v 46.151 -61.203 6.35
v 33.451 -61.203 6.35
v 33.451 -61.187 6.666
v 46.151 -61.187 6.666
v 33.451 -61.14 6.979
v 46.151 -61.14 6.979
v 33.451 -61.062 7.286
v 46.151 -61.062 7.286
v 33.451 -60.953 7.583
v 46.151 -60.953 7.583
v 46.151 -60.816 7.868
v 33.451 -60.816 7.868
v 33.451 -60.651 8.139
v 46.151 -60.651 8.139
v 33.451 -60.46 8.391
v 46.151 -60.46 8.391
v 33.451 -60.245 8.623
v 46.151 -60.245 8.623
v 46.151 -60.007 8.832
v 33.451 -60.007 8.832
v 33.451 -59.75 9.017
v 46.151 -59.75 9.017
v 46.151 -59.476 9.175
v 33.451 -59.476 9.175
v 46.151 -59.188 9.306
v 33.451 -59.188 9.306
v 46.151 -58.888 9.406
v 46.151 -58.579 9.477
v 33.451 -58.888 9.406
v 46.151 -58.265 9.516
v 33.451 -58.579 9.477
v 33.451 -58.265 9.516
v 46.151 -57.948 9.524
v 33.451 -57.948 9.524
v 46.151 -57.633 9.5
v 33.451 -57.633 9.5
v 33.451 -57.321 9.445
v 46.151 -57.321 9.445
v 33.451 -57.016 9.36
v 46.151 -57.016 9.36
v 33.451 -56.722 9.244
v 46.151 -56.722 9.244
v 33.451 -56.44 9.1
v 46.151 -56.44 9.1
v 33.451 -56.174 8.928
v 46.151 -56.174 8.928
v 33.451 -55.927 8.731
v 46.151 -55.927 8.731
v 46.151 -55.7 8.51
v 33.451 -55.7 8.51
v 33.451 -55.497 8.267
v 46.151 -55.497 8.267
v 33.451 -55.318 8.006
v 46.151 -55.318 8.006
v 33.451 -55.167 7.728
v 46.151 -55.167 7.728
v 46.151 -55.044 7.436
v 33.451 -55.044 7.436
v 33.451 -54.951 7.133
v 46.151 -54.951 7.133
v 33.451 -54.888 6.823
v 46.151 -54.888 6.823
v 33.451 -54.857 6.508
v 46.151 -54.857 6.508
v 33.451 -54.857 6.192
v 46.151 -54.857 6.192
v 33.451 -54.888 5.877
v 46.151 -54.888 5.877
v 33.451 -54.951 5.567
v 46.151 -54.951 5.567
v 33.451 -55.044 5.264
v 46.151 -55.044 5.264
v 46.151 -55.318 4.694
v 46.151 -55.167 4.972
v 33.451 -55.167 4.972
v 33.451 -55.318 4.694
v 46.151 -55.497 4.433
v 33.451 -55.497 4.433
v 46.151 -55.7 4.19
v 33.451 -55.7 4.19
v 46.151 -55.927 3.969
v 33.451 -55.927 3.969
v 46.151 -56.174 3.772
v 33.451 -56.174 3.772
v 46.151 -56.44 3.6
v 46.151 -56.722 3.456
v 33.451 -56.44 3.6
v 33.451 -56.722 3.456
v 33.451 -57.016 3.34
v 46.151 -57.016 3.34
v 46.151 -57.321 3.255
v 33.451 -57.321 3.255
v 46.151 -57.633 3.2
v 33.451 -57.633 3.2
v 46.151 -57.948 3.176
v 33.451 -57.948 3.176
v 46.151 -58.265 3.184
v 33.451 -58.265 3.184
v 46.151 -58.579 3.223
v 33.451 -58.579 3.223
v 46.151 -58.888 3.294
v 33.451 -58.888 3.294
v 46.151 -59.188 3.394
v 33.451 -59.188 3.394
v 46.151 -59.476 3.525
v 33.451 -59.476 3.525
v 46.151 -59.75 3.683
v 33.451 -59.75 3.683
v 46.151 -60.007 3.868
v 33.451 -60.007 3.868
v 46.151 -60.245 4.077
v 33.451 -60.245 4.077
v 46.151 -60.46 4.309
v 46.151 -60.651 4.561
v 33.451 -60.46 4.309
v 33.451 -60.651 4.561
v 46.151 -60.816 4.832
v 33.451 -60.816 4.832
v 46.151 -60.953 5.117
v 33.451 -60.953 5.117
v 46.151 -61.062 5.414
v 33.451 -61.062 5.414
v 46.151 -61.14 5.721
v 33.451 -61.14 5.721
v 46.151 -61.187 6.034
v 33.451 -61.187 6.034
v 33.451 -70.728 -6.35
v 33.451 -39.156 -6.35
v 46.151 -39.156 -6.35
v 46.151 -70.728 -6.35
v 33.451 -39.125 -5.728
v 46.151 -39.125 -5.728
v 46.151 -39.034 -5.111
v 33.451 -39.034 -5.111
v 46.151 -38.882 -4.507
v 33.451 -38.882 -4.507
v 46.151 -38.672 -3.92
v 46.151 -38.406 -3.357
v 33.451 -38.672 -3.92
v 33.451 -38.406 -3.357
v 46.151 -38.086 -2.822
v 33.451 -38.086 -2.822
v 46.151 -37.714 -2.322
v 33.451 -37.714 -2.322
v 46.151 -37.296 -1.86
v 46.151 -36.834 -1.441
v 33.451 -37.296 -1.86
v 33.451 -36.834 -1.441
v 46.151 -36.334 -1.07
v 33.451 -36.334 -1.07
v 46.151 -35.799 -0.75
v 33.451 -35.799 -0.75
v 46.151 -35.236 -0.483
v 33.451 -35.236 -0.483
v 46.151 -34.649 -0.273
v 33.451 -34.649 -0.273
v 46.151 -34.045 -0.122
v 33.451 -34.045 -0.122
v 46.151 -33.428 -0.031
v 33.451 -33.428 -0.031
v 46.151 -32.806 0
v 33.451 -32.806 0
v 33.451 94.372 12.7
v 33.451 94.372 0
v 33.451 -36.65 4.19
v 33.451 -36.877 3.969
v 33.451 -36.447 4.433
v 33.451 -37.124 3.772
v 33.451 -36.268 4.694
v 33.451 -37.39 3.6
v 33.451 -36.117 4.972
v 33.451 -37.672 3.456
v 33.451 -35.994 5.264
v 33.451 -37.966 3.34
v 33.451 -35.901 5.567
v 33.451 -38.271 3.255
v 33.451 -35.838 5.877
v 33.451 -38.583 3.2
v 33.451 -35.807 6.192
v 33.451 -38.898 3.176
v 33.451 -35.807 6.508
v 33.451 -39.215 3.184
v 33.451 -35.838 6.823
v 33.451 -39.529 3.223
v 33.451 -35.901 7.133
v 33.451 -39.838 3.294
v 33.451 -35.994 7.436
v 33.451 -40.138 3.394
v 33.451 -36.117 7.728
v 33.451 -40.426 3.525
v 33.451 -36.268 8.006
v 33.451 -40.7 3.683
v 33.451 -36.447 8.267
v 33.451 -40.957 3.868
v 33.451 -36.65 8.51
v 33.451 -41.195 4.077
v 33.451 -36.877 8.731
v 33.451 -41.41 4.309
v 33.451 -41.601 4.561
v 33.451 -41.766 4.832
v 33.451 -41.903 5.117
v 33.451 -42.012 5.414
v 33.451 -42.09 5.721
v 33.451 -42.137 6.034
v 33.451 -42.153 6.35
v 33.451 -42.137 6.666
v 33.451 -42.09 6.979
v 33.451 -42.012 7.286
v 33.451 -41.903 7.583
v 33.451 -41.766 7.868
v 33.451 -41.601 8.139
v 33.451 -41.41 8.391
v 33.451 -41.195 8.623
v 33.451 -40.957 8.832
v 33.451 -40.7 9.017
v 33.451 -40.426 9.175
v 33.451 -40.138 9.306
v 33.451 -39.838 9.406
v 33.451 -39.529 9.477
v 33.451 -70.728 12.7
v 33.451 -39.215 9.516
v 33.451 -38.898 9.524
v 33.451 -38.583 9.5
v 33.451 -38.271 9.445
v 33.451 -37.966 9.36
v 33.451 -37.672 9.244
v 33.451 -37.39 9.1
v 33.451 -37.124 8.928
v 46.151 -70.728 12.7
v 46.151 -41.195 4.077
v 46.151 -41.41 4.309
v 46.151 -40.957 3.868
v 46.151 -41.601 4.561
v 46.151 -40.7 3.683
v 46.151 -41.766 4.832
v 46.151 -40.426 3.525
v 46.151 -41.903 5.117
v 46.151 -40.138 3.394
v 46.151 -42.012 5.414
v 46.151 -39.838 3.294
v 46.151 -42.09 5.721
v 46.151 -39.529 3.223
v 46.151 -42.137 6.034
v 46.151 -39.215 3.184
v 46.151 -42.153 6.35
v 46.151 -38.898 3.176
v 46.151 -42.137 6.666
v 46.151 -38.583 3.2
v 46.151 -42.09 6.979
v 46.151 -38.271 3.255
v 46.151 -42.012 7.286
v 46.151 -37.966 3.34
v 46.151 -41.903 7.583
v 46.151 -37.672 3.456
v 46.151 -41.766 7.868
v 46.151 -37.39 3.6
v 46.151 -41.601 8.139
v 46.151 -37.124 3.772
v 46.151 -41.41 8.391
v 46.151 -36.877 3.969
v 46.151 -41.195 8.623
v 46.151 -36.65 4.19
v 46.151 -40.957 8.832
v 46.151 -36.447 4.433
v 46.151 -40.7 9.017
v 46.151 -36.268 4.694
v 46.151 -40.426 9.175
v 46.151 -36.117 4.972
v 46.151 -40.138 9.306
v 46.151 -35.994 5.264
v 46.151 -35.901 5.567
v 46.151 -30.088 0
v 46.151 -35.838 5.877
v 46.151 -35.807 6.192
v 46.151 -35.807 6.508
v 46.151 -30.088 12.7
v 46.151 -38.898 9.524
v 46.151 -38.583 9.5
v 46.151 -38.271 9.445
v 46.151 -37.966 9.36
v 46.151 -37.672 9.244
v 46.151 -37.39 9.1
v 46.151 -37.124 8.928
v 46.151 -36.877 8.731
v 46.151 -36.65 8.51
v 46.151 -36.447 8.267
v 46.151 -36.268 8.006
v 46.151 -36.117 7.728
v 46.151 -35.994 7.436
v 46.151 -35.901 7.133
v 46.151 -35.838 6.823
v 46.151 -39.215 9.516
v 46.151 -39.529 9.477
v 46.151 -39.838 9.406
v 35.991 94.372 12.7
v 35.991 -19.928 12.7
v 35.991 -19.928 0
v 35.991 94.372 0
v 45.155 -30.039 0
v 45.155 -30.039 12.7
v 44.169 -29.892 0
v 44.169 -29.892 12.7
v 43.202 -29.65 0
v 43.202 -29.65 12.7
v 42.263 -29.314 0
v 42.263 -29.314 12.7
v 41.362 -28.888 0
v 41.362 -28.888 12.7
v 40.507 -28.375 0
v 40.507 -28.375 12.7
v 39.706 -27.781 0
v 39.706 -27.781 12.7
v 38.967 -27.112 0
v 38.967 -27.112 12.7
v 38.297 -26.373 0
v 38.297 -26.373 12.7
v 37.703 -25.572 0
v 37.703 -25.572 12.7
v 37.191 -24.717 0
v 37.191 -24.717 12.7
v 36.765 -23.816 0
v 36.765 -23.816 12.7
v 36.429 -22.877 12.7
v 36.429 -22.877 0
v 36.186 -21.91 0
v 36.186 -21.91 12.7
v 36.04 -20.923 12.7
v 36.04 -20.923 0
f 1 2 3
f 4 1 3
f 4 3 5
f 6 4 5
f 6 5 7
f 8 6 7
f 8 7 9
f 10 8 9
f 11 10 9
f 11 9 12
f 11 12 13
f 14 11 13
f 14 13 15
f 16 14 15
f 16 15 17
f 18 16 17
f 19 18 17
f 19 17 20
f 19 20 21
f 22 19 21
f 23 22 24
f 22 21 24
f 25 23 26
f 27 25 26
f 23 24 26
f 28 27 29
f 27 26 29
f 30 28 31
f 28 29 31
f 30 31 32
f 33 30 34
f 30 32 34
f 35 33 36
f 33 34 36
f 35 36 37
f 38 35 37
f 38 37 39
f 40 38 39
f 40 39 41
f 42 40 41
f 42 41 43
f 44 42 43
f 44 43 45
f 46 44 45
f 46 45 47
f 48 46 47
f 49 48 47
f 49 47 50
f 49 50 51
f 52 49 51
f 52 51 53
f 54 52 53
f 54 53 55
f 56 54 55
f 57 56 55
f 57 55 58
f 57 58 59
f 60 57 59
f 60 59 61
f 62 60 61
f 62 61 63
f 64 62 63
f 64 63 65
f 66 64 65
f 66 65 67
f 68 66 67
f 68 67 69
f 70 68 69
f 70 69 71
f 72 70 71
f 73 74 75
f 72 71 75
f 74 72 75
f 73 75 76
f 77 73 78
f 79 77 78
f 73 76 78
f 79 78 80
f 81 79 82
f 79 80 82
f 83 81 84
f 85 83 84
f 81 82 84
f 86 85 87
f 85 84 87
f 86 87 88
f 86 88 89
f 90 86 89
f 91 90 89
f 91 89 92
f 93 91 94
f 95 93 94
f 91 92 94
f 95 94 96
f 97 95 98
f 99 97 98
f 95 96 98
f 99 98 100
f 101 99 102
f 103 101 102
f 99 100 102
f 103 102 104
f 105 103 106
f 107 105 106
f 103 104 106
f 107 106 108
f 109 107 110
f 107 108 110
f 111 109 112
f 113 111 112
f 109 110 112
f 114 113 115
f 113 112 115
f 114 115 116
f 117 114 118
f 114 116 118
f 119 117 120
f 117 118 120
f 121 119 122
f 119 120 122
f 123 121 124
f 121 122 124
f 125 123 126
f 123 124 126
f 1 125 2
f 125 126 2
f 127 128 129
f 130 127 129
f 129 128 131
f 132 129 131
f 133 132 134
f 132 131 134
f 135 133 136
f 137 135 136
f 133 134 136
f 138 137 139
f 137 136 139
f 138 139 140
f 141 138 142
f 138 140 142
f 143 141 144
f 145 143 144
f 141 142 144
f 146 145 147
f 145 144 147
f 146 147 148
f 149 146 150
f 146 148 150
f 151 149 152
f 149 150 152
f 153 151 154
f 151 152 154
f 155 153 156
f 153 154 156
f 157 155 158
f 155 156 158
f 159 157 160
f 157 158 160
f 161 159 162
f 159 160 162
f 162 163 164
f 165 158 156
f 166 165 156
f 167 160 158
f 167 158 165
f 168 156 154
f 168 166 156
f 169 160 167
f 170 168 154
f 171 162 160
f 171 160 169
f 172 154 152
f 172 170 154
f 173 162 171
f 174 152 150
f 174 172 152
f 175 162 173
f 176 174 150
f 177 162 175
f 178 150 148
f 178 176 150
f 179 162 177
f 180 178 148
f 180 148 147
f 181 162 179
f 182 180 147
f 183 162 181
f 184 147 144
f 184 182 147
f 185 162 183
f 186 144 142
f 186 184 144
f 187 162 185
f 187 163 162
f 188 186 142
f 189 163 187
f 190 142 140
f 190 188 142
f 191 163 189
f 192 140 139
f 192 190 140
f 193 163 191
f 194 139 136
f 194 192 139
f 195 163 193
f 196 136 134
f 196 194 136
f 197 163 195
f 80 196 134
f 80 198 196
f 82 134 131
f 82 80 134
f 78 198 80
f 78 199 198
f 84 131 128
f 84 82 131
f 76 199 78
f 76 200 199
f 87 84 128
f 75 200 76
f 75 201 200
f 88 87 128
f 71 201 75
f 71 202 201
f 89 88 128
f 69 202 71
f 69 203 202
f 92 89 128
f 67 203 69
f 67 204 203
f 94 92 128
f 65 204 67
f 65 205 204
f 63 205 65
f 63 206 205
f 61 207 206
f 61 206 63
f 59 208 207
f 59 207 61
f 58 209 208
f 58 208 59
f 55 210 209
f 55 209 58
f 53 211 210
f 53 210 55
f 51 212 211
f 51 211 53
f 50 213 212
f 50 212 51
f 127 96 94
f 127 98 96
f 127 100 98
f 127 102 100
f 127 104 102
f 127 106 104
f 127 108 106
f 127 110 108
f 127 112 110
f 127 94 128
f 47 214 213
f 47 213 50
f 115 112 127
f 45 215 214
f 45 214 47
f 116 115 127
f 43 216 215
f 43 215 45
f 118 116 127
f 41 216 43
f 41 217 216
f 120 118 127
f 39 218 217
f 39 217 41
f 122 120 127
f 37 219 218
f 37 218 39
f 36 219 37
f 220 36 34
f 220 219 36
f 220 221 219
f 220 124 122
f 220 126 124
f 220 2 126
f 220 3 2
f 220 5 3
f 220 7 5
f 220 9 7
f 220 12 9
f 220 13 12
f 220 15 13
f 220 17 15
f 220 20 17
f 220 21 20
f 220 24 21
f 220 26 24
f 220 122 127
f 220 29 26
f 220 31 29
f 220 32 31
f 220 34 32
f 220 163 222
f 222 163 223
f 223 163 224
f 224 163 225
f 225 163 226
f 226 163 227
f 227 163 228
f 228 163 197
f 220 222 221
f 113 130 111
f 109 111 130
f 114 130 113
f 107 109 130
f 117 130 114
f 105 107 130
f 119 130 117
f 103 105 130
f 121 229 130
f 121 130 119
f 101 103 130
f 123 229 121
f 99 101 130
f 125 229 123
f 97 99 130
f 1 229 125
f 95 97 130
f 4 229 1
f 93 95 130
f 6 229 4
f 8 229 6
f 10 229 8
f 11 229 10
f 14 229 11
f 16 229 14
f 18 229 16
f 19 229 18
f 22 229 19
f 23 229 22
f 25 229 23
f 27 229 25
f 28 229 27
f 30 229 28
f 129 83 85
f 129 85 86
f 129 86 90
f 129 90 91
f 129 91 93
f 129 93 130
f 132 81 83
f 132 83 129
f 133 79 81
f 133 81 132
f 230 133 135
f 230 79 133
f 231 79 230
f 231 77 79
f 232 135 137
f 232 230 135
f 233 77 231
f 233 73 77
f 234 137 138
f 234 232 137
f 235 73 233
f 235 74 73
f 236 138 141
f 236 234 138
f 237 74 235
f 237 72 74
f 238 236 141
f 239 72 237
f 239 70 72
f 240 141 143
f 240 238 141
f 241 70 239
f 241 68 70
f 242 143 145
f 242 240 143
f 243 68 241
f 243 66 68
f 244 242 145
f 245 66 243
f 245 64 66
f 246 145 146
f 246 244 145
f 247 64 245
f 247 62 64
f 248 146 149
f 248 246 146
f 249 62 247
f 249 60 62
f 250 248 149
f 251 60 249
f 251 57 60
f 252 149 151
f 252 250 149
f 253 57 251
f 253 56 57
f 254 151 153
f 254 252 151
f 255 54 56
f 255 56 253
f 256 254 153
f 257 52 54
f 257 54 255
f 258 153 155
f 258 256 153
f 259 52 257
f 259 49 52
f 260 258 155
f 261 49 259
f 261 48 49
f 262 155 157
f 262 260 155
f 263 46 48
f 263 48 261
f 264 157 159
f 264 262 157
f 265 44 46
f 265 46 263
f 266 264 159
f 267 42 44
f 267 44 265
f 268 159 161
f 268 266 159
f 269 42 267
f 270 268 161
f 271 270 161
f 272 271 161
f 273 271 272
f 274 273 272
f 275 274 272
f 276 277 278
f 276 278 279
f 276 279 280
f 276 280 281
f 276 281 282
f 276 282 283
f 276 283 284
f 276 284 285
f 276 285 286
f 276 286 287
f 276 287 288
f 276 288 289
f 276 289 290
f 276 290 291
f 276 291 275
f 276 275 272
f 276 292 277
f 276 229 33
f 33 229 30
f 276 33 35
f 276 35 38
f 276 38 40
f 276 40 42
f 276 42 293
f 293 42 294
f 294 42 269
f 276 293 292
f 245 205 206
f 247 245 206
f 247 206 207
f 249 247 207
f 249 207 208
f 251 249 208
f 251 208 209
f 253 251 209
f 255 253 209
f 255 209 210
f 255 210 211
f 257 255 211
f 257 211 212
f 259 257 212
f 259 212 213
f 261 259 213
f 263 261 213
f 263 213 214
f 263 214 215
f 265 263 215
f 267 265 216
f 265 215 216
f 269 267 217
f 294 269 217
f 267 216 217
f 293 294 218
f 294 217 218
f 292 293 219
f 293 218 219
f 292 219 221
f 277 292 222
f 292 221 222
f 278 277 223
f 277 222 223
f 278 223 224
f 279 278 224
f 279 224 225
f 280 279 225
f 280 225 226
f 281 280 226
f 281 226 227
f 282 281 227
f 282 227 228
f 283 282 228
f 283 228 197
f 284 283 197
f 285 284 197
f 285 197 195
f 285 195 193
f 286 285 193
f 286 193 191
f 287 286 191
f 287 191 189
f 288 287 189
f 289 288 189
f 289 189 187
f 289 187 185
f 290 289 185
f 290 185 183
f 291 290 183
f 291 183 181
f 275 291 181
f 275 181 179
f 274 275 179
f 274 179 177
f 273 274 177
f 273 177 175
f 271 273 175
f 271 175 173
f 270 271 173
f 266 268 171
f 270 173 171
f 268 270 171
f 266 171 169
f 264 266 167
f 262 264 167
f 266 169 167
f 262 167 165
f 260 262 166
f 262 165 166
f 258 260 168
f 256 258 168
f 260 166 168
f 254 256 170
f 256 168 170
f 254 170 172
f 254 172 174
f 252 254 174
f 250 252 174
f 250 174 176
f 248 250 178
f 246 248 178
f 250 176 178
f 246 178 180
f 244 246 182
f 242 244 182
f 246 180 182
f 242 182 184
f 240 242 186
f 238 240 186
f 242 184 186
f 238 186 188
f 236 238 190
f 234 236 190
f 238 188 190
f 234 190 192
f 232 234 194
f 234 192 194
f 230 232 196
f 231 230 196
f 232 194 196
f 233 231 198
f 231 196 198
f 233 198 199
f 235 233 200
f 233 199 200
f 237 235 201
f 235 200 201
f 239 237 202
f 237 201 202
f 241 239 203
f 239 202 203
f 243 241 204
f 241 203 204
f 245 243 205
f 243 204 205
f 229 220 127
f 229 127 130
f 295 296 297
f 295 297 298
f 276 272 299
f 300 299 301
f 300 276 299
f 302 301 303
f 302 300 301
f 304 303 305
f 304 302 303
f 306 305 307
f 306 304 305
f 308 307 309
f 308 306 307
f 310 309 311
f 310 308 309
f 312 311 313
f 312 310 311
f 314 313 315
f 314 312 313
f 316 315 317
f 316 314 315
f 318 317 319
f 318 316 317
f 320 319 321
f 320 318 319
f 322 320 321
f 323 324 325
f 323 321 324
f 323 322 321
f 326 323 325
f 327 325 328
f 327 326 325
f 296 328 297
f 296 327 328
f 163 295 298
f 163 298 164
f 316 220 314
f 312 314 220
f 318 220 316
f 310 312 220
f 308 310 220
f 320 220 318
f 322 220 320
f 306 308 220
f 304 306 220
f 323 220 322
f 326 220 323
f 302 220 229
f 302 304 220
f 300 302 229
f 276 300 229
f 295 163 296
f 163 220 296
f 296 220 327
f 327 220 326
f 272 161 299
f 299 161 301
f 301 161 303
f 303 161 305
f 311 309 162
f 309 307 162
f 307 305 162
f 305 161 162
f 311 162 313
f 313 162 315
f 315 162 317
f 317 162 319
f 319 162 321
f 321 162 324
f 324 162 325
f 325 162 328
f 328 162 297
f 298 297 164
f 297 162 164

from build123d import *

# Parameters (mm, degrees)
F1_DEPTH = 12.7
F2_R     = 3.175
F3_DEPTH = 25.4
F4_DEPTH = 6.35
F6_DEPTH = 25.4


with BuildPart() as f1:
    # F0 (on Top) → F1 (new body)
    with BuildSketch(Plane.XY):
        with BuildLine():
            Line((35.9911476828, 94.3723806679), (33.4511476828, 94.3723806679))
            Line((33.4511476828, 94.3723806679), (33.4511476828, -70.7276193321))
            Line((33.4511476828, -70.7276193321), (46.1511476828, -70.7276193321))
            Line((46.1511476828, -70.7276193321), (46.1511476828, -30.0876193321))
            ThreePointArc((46.1511476828, -30.0876193321), (38.9669427859, -27.1118242289), (35.9911476828, -19.9276193321))
            Line((35.9911476828, -19.9276193321), (35.9911476828, 94.3723806679))
        make_face()
    extrude(amount=F1_DEPTH)

    # F2 (on face) → F3 (cut)
    with BuildSketch(Plane(origin=(33.4511476828, 0, 0), x_dir=(0, -1, 0), z_dir=(-1, 0, 0))):
        with Locations((58.0276193321, 6.35)):
            Circle(F2_R)
        with Locations((38.9776193321, 6.35)):
            Circle(F2_R)
    extrude(amount=-F3_DEPTH, mode=Mode.SUBTRACT)

    # F4 (add): a face of the model
    f4_faces = [f1.faces().sort_by_distance(p)[0] for p in [
        (34.3352702719, 37.2223806679, 0),
    ]]
    extrude(f4_faces, amount=F4_DEPTH)

    # F5 (on face) → F6 (cut)
    with BuildSketch(Plane(origin=(33.4511476828, 0, 0), x_dir=(0, -1, 0), z_dir=(-1, 0, 0))):
        with BuildLine():
            Line((32.8058376908, 0), (-94.3723806679, 0))
            Line((-94.3723806679, 0), (-94.3723806679, -6.35))
            Line((-94.3723806679, -6.35), (39.1558376908, -6.35))
            ThreePointArc((39.1558376908, -6.35), (37.2959657514, -1.8598719395), (32.8058376908, 0))
        make_face()
    extrude(amount=-F6_DEPTH, mode=Mode.SUBTRACT)


solid = f1.part
